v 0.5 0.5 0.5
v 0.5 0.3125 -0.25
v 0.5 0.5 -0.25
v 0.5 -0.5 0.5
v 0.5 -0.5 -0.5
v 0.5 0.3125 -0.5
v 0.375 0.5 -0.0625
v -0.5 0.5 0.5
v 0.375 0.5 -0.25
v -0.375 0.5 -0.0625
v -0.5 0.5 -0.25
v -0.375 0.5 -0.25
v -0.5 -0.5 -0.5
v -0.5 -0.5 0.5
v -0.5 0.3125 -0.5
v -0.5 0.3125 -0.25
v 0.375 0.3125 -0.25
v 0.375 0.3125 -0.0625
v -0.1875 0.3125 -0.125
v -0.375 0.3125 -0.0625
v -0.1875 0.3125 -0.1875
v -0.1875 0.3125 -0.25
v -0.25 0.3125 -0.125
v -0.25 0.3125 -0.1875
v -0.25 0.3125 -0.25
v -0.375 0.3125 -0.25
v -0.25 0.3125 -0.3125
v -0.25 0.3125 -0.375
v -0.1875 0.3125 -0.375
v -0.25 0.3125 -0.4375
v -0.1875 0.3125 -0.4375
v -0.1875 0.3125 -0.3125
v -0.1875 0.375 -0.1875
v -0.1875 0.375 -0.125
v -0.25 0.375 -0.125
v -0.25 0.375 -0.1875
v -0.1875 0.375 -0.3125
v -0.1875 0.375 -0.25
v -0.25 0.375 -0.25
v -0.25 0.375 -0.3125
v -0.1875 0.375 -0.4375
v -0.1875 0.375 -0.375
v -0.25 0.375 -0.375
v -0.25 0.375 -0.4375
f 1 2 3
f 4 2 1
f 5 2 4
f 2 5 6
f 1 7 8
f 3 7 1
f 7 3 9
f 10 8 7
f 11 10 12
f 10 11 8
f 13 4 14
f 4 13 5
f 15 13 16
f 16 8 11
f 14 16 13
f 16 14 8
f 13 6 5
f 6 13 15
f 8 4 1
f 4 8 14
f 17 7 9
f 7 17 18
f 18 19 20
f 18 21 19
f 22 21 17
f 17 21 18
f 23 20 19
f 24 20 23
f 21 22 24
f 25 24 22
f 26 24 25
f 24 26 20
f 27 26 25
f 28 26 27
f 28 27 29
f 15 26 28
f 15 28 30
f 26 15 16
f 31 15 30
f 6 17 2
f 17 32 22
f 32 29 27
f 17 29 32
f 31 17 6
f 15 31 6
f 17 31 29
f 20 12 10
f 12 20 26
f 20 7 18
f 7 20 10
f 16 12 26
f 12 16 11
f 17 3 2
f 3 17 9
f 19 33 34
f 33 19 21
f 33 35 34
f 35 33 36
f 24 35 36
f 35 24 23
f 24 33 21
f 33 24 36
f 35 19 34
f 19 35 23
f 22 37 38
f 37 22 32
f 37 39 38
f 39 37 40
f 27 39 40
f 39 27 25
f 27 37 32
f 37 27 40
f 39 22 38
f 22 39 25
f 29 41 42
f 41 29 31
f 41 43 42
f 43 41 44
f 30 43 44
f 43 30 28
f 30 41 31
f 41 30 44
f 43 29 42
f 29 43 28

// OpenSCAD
rotate(-90, [1, 0, 0]) {
    difference() {
        cube([1, 1, 1], center = true);
        translate([0, 8/16, 8/16])
            cube([12/16, 14/16, 6/16], center = true);
        
        translate([0, 8/16, 8/16])
            cube([20/16, 8/16, 6/16], center = true);
    }

    translate([-4/16, 2/16, 5/16])
        cube([1/16, 1/16, 1/16]);

    translate([-4/16, 4/16, 5/16])
        cube([1/16, 1/16, 1/16]);

    translate([-4/16, 6/16, 5/16])
        cube([1/16, 1/16, 1/16]);
}
